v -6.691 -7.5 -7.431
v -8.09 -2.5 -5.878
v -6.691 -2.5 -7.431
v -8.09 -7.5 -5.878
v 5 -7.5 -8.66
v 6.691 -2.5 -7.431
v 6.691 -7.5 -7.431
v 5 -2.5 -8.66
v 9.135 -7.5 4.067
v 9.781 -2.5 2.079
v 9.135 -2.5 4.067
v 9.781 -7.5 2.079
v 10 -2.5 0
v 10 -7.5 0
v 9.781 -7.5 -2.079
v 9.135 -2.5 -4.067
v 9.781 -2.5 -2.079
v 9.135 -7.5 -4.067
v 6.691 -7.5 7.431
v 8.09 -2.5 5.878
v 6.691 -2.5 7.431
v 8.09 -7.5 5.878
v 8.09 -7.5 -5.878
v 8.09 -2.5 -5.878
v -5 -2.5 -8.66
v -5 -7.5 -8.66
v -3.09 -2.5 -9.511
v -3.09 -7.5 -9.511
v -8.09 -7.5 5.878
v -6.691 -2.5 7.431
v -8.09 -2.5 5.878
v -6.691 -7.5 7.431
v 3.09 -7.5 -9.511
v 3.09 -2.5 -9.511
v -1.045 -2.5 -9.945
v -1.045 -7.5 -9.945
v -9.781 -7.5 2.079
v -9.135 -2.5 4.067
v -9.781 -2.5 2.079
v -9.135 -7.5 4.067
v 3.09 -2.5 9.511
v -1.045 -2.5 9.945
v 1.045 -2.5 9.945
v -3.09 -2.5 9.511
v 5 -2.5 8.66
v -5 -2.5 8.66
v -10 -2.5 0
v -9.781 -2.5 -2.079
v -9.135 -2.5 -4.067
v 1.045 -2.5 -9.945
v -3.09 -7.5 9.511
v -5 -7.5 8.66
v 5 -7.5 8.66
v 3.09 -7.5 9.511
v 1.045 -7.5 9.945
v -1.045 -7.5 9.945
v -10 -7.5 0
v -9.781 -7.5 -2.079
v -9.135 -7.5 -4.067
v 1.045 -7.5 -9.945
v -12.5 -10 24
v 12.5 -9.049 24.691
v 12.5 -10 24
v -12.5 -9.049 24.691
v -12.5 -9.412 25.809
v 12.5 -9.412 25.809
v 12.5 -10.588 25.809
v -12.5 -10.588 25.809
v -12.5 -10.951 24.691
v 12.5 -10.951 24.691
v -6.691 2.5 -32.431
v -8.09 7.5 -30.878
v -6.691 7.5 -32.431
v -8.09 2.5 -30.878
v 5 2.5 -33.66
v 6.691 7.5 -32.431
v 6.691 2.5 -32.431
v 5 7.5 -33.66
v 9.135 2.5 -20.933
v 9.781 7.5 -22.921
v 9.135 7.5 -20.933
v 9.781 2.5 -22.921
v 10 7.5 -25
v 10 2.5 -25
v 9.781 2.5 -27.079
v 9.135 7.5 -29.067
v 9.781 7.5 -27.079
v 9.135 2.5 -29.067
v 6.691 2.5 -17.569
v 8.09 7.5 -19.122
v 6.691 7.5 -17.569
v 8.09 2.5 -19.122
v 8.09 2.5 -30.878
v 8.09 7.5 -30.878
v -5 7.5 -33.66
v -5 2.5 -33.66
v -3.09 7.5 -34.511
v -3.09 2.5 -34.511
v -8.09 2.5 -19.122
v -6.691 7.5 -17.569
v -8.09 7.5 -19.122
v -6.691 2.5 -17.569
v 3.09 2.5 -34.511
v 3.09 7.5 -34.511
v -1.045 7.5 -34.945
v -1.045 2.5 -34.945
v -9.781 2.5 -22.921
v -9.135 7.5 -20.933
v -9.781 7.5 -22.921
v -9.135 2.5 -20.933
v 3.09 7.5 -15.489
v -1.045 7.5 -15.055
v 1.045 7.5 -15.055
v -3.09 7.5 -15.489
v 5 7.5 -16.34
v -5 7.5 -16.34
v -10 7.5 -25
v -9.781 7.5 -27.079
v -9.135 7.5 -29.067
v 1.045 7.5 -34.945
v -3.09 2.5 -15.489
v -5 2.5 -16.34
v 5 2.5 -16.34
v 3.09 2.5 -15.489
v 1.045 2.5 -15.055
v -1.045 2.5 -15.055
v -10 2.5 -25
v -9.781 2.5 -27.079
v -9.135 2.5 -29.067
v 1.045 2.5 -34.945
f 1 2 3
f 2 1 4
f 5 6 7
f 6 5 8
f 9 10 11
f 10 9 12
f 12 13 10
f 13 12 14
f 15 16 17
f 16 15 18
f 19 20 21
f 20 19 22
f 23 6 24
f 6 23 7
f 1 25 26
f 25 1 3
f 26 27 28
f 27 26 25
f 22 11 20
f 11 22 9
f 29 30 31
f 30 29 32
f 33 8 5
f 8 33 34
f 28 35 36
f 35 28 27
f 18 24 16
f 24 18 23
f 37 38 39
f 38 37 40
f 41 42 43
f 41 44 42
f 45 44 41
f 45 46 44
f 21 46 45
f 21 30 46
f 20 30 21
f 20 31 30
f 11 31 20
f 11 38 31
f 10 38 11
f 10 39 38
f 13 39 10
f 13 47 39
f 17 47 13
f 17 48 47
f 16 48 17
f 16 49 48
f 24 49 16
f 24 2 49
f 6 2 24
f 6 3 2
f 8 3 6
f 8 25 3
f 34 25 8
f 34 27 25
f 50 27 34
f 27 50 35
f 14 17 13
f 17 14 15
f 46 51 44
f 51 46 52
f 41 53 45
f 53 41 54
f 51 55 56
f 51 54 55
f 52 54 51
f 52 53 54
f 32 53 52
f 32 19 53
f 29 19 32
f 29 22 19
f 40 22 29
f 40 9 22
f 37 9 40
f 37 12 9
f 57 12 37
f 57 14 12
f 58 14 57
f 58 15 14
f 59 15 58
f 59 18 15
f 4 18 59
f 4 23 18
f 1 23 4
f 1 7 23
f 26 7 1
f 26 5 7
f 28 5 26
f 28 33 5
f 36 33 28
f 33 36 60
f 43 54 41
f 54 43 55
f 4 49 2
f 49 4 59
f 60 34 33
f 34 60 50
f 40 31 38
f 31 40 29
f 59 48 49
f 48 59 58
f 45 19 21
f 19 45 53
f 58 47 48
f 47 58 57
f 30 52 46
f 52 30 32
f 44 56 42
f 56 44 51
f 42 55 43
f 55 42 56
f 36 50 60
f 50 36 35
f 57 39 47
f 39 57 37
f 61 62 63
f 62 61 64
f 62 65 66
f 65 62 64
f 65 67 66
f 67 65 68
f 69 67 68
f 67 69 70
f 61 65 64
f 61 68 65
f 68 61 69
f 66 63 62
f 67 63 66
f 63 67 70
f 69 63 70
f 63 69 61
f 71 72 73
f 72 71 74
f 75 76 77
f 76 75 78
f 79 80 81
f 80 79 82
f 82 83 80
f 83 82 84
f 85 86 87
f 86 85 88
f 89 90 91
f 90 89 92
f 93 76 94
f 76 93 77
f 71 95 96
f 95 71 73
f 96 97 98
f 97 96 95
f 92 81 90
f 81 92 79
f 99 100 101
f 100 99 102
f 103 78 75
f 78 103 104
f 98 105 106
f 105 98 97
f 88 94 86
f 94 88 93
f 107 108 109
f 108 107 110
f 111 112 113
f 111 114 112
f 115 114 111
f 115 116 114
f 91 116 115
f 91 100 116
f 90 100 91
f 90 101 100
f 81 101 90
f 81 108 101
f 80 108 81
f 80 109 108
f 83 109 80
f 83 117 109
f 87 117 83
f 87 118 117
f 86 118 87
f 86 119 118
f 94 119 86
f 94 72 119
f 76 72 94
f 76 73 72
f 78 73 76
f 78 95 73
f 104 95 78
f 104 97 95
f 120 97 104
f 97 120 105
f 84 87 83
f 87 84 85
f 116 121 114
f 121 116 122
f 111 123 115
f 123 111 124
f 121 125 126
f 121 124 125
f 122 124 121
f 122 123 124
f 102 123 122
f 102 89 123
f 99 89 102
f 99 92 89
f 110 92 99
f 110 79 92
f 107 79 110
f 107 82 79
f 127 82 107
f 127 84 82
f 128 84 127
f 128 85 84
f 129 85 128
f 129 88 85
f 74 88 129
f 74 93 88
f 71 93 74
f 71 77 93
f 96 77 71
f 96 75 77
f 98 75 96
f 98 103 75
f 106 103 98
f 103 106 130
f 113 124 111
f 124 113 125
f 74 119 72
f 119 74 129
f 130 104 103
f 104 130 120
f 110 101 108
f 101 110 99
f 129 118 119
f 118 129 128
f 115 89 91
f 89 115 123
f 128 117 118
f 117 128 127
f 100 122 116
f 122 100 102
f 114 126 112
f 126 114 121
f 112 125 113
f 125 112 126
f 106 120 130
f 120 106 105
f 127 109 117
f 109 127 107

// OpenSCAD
translate([0,-5,0])rotate([90,0,0])cylinder(5,10,10,true);
translate([0,-10,25])rotate([0,90,0])cylinder(25,1,1,true);

translate([0-0,-5--10,0-25])rotate([90,0,0])cylinder(5,10,10,true);

module rotateAboutAxis(vectorOfObjectToRotate,vectorOfRotationAxis,angle)
{
	origin=vectorOfObjectToRotate-vectorOfRotationAxis;
}

echo ([1,2,3]-[4,5,6]);
